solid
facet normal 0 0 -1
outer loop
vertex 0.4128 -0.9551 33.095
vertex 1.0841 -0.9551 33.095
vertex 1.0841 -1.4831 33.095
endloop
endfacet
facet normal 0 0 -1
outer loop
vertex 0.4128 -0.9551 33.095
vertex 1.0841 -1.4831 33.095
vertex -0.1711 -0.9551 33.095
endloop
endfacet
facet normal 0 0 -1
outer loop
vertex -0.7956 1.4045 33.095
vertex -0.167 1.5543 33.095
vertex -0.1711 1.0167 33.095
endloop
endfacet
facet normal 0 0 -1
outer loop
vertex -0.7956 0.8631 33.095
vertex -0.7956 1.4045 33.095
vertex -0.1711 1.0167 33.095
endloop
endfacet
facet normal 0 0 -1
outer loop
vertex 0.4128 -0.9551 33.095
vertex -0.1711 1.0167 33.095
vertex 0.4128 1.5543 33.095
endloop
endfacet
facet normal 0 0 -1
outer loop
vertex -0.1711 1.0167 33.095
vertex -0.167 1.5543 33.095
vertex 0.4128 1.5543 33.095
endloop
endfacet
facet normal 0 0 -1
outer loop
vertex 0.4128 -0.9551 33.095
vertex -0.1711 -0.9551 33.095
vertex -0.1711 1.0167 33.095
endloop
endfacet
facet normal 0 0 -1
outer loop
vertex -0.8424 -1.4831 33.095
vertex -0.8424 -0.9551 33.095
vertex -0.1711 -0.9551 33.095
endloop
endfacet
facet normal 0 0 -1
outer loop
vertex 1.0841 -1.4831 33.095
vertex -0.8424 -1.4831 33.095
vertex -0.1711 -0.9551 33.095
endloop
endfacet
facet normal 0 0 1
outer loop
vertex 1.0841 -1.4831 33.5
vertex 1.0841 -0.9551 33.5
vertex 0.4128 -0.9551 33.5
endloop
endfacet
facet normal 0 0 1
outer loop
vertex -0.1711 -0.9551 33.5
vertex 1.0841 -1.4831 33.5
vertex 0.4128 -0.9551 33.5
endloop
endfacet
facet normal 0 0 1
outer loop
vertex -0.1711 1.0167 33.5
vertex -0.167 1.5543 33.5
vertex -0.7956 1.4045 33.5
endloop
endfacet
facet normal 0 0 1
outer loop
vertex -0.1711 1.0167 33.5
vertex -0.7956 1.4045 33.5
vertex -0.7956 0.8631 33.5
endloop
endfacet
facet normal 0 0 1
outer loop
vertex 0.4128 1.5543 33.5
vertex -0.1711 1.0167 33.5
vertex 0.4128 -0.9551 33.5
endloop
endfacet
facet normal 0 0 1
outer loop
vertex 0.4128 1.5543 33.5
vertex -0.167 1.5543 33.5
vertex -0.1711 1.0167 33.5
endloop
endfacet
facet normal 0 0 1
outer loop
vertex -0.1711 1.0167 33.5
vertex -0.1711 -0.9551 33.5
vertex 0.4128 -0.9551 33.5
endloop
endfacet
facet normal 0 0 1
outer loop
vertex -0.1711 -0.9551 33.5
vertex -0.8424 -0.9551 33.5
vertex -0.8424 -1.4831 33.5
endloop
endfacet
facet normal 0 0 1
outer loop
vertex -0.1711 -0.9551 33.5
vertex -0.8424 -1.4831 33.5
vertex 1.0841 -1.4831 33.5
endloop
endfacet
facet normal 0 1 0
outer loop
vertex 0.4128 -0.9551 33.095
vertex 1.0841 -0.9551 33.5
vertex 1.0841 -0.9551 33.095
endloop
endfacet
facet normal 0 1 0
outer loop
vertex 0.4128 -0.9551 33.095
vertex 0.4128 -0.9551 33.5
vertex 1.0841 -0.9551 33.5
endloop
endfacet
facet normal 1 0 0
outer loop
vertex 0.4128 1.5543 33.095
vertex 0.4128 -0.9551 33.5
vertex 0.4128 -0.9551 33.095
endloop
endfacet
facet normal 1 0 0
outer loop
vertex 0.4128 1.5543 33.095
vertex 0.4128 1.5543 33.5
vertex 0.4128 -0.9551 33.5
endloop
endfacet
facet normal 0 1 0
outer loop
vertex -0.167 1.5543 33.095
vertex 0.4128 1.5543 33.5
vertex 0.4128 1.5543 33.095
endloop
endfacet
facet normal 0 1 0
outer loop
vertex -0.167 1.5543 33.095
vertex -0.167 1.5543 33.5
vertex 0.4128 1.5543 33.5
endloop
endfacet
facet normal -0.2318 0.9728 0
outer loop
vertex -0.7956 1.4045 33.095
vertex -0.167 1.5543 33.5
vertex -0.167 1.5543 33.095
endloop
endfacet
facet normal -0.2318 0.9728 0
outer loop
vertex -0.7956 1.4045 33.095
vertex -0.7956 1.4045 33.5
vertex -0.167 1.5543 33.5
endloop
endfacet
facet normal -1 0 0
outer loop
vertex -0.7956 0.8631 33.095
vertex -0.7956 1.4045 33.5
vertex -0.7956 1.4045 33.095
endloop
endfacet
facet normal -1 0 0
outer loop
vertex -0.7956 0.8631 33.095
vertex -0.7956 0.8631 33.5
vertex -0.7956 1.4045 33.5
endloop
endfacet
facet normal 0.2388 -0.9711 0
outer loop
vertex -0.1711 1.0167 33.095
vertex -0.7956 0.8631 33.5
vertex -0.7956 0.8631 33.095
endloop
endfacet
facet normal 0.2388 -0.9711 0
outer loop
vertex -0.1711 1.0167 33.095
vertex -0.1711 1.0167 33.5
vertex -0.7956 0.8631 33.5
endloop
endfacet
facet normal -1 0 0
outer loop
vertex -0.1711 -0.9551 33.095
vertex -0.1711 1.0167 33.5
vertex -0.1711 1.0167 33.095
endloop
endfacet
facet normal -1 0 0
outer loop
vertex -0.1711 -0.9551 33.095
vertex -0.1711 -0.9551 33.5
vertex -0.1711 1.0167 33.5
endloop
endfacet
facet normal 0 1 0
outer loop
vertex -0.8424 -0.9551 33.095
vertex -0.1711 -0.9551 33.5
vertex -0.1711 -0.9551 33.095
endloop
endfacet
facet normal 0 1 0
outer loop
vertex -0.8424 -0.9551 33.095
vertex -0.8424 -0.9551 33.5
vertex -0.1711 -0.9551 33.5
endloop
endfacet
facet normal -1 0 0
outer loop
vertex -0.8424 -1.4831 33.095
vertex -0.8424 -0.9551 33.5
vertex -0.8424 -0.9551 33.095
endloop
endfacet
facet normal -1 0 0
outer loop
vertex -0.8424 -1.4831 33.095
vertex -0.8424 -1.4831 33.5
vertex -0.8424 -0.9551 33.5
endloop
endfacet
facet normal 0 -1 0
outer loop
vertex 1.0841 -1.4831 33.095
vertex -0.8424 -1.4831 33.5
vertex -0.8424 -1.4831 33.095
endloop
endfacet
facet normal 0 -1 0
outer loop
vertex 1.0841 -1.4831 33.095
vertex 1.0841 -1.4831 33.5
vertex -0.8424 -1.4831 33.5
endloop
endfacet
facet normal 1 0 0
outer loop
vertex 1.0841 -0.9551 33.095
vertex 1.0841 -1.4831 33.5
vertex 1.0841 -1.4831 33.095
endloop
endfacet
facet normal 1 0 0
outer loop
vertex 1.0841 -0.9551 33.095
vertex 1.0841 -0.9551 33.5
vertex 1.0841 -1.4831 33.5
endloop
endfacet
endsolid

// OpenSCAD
/* Inner width of the case */
wcase = 70;

/* Inner length of the case */
lcase = 90;

/* Height of the board support: Speaker + components */
hpcbsupport = 20.5 + 14;

/* Inner height of the case. 
 * Speaker + components + board + trimmer + safety. 
 */
hcase = hpcbsupport + 1.6 + 7 + 1;

/* Height of the lid support */
hlidsupport = hcase;

/* Gap between board and case */
gap = 0.4;

/* Radius for case edges */
rcase = 1.0;

/* Speaker diameter */
dspeaker = 66;

/* Wall width */
wall = 1.6;

/* Groove width */
groove = 0.6;

/* Screw hole diameter for self cutting screws */
mountinghole = 2.7;

/* Screw hole diameter for lid screws */
lidhole = 3.2;

/* Lower diameter of the feet */
dfoot = 11.0;

/* Height of the feet */
hfoot = 3.0;

/* Trimmer hole diameter */
trimmerhole = 5.0;

/* Button holes */
buttonhole = 6.0;

/* Hidden */
$fn  =  100;
eps  =  0.005;

/* Trimmer position #1 */
xtrimmer1 = 55.7;
ytrimmer1 = 57.8;

/* Trimmer position #2 */
xtrimmer2 = 64.3;
ytrimmer2 = 25.4;

/* Button position #1 */
xbutton1 = 18;
ybutton1 = 44;

/* Button position #2 */
xbutton2 = 18;
ybutton2 = 35;

/* Button position #3 */
xbutton3 = 18;
ybutton3 = 26;

/* Height of button prolongation. Switches are 9mm high, 5mm is overlap. */
hbutton = hpcbsupport + wall - 9.0 + 6.0;

/* Paddle jack position */
xpaddle = 14.6425;
ypaddle = hpcbsupport - 3.05;
paddlehole = 6.5;

/* Volume control position */
xvolume = 54.135;
yvolume = hpcbsupport - 10.0;
volumehole = 7.0;

/* Rig control socket position */
xrigctrl = 35.0;
yrigctrl = hpcbsupport - 10.0;
rigctrlhole = 16.0;


module cylinder_outer(height, r1, r2){
    fudge = 1/cos(180/$fn);
    cylinder(h=height,r1=r1*fudge, r2=r2*fudge);
}

module roundedplate(x, y, z, rad = 0.75) {
    linear_extrude(height = z) {
        hull() {
            translate([0.75, 0.75, 0]) circle(r = 0.75);
            translate([x - 0.75, 0.75, 0]) circle(r = 0.75);
            translate([x - 0.75, y - 0.75, 0]) circle(r = 0.75);
            translate([0.75, y - 0.75, 0]) circle(r = 0.75);
        }
    }
}

module roundedcube(x, y, z, rad = 0.75) {
    hull() {
        translate([    rad,     rad,     rad]) sphere(rad);
        translate([x - rad,     rad,     rad]) sphere(rad);
        translate([    rad, y - rad,     rad]) sphere(rad);
        translate([x - rad, y - rad,     rad]) sphere(rad);
        translate([    rad,     rad, z - rad]) sphere(rad);
        translate([x - rad,     rad, z - rad]) sphere(rad);
        translate([    rad, y - rad, z - rad]) sphere(rad);
        translate([x - rad, y - rad, z - rad]) sphere(rad);
    }
}

module label(text, ha = "center", va = "center") {
    color("orange") {
        translate([0, 0, -eps]) {
            linear_extrude(0.4 + eps) {
                //text(text, size=3, font="Liberation Mono:style=Bold", halign=ha, valign=va);
                //text(text, size=3, font="Arial:style=Bold", halign=ha, valign=va);
                text(text, size=3.0, font="Bitstream Vera Sans Mono:style=Bold", halign=ha, valign=va);
            }
        }
    }
}

module usb_breakout() {
    l = 9;
    h = 4;
    w = 15.8;
    hole = 2.5;
    translate([-l/2, -h/2, -eps]) {
        roundedplate(l, h, wall+2*eps, 1.0);
    }
    translate([-w/2, 0, -eps]) {
        cylinder_outer(wall + 2*eps, hole/2, hole/2);
    }
    translate([w/2, 0, -eps]) {
        cylinder_outer(wall + 2*eps, hole/2, hole/2);
    }
}

module lidsupport(rot) {
    h = hlidsupport + eps;
    lscrew = 12.0;
    rotate([0, 0, rot]) {
        translate([-3 - eps, -3 - eps, 0]) {
            difference() {
                union() {
                    roundedplate(6 + 2*eps, 6 + 2*eps, h);
                    cube([6 + 1.5*eps, 1, h]);
                    cube([1.5, 6 + 2*eps, h]);
                }
                translate([3.0 + eps, 3.0 + eps, h - lscrew]) {
                    cylinder_outer(lscrew + eps, mountinghole/2, mountinghole/2);
                }
            }
        }
    }
}

module pcbsupport(rot) {
    h = hpcbsupport + eps;
    lscrew = 12.0;
    rotate([0, 0, rot]) {
        translate([-3 - eps, -3 - eps, 0]) {
            difference() {
                union() {
                    cube([7 + 2*eps, 7 + 2*eps, h]);
                }
                translate([4.0 + eps, 4.0 + eps, h - lscrew]) {
                    cylinder_outer(lscrew + eps, mountinghole/2, mountinghole/2);
                }
            }
        }
    }
}

module speakerhook() {
    translate([-1.5, 2, 0]) {
        rotate([0, 270, 180]) 
        linear_extrude(height = 3) {
            polygon(points=[[0, 0], [0, 2], [3.0, 2], [4.0, 4], [4.0, 0]]);
        }
    }
}

module speakerscrewholder() {
    translate([-3-eps, -3-eps, -eps]) {
        difference() {
            cube([6 + 2*eps, 6 + 2*eps, 5.5 + eps]);
            translate([3.0 + eps, 3.0 + eps, 0 - eps]) {
                cylinder_outer(5.5 + 3*eps, mountinghole/2, mountinghole/2);
            }
        }
    }
}

module speakerholders() {
    rotate([0, 0, 285]) {
        translate([0, dspeaker / 2 + 1, 0]) {
            speakerhook();
        }
    }
    rotate([0, 0, 155]) {
        translate([0, dspeaker / 2 + 1, 0]) {
            speakerhook();
        }
    }
    rotate([0, 0, 45]) {
        translate([0, 10, 0]) {
            translate([0, dspeaker / 2, 0]) {
                speakerscrewholder();
            }
        }
    }
}

module speakerholes() {
    for (angle = [0:11.25:360]) {
        rotate([0, 0, angle]) {
            translate([29, 0, 0]) {
                cylinder(wall + 2*eps, r1=1, r2=1);
            }
            translate([25, 0, 0]) {
                cylinder(wall + 2*eps, r1=1, r2=1);
            }
            translate([21, 0, 0]) {
                cylinder(wall + 2*eps, r1=1, r2=1);
            }
            translate([17, 0, 0]) {
                cylinder(wall + 2*eps, r1=1, r2=1);
            }
        }
    }
    for (angle = [0:22.5:360]) {
        rotate([0, 0, angle]) {
            translate([13, 0, 0]) {
                cylinder(wall + 2*eps, r1=1, r2=1);
            }
            translate([9, 0, 0]) {
                cylinder(wall + 2*eps, r1=1, r2=1);
            }
        }
    }
    for (angle = [0:45:360]) {
        rotate([0, 0, angle]) {
            translate([5, 0, 0]) {
                cylinder(wall + 2*eps, r1=1, r2=1);
            }
        }
    }
    cylinder(wall + 2*eps, r1=1, r2=1);
}

module upper() {
    x = lcase + 2*gap + 2*wall;
    y = wcase + 2*gap + 2*wall;
    z = hcase + 2*wall + rcase;
    difference() {
        /* Case outer bounds */
        roundedcube(x, y, z, rcase);
        /* Cut off the upper part with the rounded edges */
        translate([-eps, -eps, hcase + 2*wall]) {
            cube([x + 2*eps, y+2*eps, rcase+eps]);
        }
        /* Space inside the case */
        translate([wall, wall, wall]) {
            roundedcube(lcase + 2*gap, wcase+2*gap, hcase+2*wall);
        }
        /* Groove for the lid */
        translate([wall-groove, wall-groove, hcase + wall]) {
            roundedplate(lcase + 2*gap + 2*groove, wcase + 2*gap + 2*groove, wall + eps);
        }
        /* Sound holes for the speaker */
        translate([lcase + wall + gap - dspeaker/2, wcase/2 + gap + wall, 0]) {
            speakerholes();
        }
        /* Button holes */
        translate([wall + gap + xbutton1, wall + gap + ybutton1, -eps]) {
            cylinder_outer(wall + 2*eps, buttonhole/2, buttonhole/2);
        }
        translate([wall + gap + xbutton2, wall + gap + ybutton2, -eps]) {
            cylinder_outer(wall + 2*eps, buttonhole/2, buttonhole/2);
        }
        translate([wall + gap + xbutton3, wall + gap + ybutton3, -eps]) {
            cylinder_outer(wall + 2*eps, buttonhole/2, buttonhole/2);
        }
        /* Hole for paddle socket */
        translate([-eps, wall + gap + xpaddle, wall + ypaddle]) {
            rotate([90, 90, 90]) {
                cylinder_outer(wall + 2*eps, paddlehole/2, paddlehole/2);
            }            
        }   
        /* Hole for volume control */
        translate([-eps, wall + gap + xvolume, wall + yvolume]) {
            rotate([90, 90, 90]) {
                cylinder_outer(wall + 2*eps, volumehole/2, volumehole/2);
            }            
        }   
        /* Hole for rig control socket */
        translate([lcase + wall + 2*gap - eps, wall + gap + xrigctrl, wall + yrigctrl]) {
            rotate([90, 90, 90]) {
                cylinder_outer(wall + 2*eps, rigctrlhole/2, rigctrlhole/2);
            }            
        }   
        /* USB breakout */
        translate([0, wall + gap + wcase/2, wall + 10]) {
            rotate([90, 0, 90]) {
                usb_breakout();
            }            
        }   
    }
    /* Mounting support for the lid */
    translate([wall + 3 - eps, wall + 3 - eps, wall-eps]) {
        lidsupport(0);
    }
    translate([wall + lcase + 2*gap - 3 + eps, wall + 3 - eps, wall-eps]) {
        lidsupport(90);
    }
    translate([wall + lcase + 2*gap - 3 + eps, wall + wcase +2*gap - 3 + eps, wall-eps]) {
        lidsupport(180);
    }
    translate([wall + 3 - eps, wall + wcase +2*gap - 3 + eps, wall-eps]) {
        lidsupport(270);
    }
    /* Mounting support for the board */
    translate([wall + 6 + 3 - eps, wall + 3 - eps, wall-eps]) {
        pcbsupport(0);
    }
    translate([wall + lcase +2*gap - 9 + eps, wall + 3 - eps, wall-eps]) {
        pcbsupport(90);
    }
    translate([wall + lcase +2*gap - 9 + eps, wall + wcase + 2*gap - 3 + eps, wall-eps]) {
        pcbsupport(180);
    }
    translate([wall + 9 - eps, wall + wcase +2*gap - 3 + eps, wall-eps]) {
        pcbsupport(270);
    }
    /* Holders for the speaker */
    translate([lcase + wall + gap - dspeaker/2, wcase/2 + gap + wall, wall - eps]) {
        rotate([0, 0, 90]) {
            speakerholders();
        }
    }
}

module foot() {
    difference() {
        cylinder(hfoot + eps, dfoot/2, (dfoot-1)/2);
        translate([0, 0, hfoot-0.5]) {
            cylinder(1, (dfoot-3)/2, (dfoot-3)/2);
        }
    }
}

module lower() {
    difference() {
        /* Lid */
        roundedplate(lcase + 2*gap + 2*groove, wcase + 2*gap + 2*groove, wall);
        /* Screw holes */
        translate([3 + groove, 3 + groove, -eps]) {
            cylinder_outer(wall+2*eps, lidhole/2, lidhole/2);
        }
        translate([lcase + gap + groove - 3, 3 + gap + groove, -eps]) {
            cylinder_outer(wall+2*eps, lidhole/2, lidhole/2);
        }
        translate([3 + groove, wcase + gap + groove - 3, -eps]) {
            cylinder_outer(wall+2*eps, lidhole/2, lidhole/2);
        }
        translate([lcase + gap + groove - 3, wcase + gap + groove - 3, -eps]) {
            cylinder_outer(wall+2*eps, lidhole/2, lidhole/2);
        }
        /* Trimmer holes */
        translate([groove + xtrimmer1, groove + ytrimmer1, -eps]) {
            cylinder_outer(wall + 2*eps, trimmerhole/2, trimmerhole/2);
        }   
        translate([groove + xtrimmer2, groove + ytrimmer2, -eps]) {
            cylinder_outer(wall + 2*eps, trimmerhole/2, trimmerhole/2);
        }   
    }
    /* Feet */
    translate([6 + groove + dfoot/2, groove + dfoot/2, wall-eps]) {
        foot();
    }
    translate([lcase - 6 - dfoot/2, groove + dfoot/2, wall-eps]) {
        foot();
    }
    translate([6 + groove + dfoot/2, wcase + groove - dfoot/2, wall-eps]) {
        foot();
    }
    translate([lcase - 6 - dfoot/2, wcase + groove - dfoot/2, wall-eps]) {
        foot();
    }
}

module button(text) {
    union() {
        *difference() {
            cylinder_outer(hbutton, buttonhole/2 - 0.3, buttonhole/2 - 0.3);
            translate([0, 0, -eps]) {
                cylinder_outer(5.0 + eps, 4.0/2, 3.3/2);
            }
        }
        translate([0, 0, hbutton]) {
            label(text, va="center", ha="center");
        }
    }
}

*upper();

*translate([0, 100, 0]) {
    lower();
}

*translate([0, dspeaker / 2, 0]) {
    speakerhook();
}

*usb_breakout();

button("1");
